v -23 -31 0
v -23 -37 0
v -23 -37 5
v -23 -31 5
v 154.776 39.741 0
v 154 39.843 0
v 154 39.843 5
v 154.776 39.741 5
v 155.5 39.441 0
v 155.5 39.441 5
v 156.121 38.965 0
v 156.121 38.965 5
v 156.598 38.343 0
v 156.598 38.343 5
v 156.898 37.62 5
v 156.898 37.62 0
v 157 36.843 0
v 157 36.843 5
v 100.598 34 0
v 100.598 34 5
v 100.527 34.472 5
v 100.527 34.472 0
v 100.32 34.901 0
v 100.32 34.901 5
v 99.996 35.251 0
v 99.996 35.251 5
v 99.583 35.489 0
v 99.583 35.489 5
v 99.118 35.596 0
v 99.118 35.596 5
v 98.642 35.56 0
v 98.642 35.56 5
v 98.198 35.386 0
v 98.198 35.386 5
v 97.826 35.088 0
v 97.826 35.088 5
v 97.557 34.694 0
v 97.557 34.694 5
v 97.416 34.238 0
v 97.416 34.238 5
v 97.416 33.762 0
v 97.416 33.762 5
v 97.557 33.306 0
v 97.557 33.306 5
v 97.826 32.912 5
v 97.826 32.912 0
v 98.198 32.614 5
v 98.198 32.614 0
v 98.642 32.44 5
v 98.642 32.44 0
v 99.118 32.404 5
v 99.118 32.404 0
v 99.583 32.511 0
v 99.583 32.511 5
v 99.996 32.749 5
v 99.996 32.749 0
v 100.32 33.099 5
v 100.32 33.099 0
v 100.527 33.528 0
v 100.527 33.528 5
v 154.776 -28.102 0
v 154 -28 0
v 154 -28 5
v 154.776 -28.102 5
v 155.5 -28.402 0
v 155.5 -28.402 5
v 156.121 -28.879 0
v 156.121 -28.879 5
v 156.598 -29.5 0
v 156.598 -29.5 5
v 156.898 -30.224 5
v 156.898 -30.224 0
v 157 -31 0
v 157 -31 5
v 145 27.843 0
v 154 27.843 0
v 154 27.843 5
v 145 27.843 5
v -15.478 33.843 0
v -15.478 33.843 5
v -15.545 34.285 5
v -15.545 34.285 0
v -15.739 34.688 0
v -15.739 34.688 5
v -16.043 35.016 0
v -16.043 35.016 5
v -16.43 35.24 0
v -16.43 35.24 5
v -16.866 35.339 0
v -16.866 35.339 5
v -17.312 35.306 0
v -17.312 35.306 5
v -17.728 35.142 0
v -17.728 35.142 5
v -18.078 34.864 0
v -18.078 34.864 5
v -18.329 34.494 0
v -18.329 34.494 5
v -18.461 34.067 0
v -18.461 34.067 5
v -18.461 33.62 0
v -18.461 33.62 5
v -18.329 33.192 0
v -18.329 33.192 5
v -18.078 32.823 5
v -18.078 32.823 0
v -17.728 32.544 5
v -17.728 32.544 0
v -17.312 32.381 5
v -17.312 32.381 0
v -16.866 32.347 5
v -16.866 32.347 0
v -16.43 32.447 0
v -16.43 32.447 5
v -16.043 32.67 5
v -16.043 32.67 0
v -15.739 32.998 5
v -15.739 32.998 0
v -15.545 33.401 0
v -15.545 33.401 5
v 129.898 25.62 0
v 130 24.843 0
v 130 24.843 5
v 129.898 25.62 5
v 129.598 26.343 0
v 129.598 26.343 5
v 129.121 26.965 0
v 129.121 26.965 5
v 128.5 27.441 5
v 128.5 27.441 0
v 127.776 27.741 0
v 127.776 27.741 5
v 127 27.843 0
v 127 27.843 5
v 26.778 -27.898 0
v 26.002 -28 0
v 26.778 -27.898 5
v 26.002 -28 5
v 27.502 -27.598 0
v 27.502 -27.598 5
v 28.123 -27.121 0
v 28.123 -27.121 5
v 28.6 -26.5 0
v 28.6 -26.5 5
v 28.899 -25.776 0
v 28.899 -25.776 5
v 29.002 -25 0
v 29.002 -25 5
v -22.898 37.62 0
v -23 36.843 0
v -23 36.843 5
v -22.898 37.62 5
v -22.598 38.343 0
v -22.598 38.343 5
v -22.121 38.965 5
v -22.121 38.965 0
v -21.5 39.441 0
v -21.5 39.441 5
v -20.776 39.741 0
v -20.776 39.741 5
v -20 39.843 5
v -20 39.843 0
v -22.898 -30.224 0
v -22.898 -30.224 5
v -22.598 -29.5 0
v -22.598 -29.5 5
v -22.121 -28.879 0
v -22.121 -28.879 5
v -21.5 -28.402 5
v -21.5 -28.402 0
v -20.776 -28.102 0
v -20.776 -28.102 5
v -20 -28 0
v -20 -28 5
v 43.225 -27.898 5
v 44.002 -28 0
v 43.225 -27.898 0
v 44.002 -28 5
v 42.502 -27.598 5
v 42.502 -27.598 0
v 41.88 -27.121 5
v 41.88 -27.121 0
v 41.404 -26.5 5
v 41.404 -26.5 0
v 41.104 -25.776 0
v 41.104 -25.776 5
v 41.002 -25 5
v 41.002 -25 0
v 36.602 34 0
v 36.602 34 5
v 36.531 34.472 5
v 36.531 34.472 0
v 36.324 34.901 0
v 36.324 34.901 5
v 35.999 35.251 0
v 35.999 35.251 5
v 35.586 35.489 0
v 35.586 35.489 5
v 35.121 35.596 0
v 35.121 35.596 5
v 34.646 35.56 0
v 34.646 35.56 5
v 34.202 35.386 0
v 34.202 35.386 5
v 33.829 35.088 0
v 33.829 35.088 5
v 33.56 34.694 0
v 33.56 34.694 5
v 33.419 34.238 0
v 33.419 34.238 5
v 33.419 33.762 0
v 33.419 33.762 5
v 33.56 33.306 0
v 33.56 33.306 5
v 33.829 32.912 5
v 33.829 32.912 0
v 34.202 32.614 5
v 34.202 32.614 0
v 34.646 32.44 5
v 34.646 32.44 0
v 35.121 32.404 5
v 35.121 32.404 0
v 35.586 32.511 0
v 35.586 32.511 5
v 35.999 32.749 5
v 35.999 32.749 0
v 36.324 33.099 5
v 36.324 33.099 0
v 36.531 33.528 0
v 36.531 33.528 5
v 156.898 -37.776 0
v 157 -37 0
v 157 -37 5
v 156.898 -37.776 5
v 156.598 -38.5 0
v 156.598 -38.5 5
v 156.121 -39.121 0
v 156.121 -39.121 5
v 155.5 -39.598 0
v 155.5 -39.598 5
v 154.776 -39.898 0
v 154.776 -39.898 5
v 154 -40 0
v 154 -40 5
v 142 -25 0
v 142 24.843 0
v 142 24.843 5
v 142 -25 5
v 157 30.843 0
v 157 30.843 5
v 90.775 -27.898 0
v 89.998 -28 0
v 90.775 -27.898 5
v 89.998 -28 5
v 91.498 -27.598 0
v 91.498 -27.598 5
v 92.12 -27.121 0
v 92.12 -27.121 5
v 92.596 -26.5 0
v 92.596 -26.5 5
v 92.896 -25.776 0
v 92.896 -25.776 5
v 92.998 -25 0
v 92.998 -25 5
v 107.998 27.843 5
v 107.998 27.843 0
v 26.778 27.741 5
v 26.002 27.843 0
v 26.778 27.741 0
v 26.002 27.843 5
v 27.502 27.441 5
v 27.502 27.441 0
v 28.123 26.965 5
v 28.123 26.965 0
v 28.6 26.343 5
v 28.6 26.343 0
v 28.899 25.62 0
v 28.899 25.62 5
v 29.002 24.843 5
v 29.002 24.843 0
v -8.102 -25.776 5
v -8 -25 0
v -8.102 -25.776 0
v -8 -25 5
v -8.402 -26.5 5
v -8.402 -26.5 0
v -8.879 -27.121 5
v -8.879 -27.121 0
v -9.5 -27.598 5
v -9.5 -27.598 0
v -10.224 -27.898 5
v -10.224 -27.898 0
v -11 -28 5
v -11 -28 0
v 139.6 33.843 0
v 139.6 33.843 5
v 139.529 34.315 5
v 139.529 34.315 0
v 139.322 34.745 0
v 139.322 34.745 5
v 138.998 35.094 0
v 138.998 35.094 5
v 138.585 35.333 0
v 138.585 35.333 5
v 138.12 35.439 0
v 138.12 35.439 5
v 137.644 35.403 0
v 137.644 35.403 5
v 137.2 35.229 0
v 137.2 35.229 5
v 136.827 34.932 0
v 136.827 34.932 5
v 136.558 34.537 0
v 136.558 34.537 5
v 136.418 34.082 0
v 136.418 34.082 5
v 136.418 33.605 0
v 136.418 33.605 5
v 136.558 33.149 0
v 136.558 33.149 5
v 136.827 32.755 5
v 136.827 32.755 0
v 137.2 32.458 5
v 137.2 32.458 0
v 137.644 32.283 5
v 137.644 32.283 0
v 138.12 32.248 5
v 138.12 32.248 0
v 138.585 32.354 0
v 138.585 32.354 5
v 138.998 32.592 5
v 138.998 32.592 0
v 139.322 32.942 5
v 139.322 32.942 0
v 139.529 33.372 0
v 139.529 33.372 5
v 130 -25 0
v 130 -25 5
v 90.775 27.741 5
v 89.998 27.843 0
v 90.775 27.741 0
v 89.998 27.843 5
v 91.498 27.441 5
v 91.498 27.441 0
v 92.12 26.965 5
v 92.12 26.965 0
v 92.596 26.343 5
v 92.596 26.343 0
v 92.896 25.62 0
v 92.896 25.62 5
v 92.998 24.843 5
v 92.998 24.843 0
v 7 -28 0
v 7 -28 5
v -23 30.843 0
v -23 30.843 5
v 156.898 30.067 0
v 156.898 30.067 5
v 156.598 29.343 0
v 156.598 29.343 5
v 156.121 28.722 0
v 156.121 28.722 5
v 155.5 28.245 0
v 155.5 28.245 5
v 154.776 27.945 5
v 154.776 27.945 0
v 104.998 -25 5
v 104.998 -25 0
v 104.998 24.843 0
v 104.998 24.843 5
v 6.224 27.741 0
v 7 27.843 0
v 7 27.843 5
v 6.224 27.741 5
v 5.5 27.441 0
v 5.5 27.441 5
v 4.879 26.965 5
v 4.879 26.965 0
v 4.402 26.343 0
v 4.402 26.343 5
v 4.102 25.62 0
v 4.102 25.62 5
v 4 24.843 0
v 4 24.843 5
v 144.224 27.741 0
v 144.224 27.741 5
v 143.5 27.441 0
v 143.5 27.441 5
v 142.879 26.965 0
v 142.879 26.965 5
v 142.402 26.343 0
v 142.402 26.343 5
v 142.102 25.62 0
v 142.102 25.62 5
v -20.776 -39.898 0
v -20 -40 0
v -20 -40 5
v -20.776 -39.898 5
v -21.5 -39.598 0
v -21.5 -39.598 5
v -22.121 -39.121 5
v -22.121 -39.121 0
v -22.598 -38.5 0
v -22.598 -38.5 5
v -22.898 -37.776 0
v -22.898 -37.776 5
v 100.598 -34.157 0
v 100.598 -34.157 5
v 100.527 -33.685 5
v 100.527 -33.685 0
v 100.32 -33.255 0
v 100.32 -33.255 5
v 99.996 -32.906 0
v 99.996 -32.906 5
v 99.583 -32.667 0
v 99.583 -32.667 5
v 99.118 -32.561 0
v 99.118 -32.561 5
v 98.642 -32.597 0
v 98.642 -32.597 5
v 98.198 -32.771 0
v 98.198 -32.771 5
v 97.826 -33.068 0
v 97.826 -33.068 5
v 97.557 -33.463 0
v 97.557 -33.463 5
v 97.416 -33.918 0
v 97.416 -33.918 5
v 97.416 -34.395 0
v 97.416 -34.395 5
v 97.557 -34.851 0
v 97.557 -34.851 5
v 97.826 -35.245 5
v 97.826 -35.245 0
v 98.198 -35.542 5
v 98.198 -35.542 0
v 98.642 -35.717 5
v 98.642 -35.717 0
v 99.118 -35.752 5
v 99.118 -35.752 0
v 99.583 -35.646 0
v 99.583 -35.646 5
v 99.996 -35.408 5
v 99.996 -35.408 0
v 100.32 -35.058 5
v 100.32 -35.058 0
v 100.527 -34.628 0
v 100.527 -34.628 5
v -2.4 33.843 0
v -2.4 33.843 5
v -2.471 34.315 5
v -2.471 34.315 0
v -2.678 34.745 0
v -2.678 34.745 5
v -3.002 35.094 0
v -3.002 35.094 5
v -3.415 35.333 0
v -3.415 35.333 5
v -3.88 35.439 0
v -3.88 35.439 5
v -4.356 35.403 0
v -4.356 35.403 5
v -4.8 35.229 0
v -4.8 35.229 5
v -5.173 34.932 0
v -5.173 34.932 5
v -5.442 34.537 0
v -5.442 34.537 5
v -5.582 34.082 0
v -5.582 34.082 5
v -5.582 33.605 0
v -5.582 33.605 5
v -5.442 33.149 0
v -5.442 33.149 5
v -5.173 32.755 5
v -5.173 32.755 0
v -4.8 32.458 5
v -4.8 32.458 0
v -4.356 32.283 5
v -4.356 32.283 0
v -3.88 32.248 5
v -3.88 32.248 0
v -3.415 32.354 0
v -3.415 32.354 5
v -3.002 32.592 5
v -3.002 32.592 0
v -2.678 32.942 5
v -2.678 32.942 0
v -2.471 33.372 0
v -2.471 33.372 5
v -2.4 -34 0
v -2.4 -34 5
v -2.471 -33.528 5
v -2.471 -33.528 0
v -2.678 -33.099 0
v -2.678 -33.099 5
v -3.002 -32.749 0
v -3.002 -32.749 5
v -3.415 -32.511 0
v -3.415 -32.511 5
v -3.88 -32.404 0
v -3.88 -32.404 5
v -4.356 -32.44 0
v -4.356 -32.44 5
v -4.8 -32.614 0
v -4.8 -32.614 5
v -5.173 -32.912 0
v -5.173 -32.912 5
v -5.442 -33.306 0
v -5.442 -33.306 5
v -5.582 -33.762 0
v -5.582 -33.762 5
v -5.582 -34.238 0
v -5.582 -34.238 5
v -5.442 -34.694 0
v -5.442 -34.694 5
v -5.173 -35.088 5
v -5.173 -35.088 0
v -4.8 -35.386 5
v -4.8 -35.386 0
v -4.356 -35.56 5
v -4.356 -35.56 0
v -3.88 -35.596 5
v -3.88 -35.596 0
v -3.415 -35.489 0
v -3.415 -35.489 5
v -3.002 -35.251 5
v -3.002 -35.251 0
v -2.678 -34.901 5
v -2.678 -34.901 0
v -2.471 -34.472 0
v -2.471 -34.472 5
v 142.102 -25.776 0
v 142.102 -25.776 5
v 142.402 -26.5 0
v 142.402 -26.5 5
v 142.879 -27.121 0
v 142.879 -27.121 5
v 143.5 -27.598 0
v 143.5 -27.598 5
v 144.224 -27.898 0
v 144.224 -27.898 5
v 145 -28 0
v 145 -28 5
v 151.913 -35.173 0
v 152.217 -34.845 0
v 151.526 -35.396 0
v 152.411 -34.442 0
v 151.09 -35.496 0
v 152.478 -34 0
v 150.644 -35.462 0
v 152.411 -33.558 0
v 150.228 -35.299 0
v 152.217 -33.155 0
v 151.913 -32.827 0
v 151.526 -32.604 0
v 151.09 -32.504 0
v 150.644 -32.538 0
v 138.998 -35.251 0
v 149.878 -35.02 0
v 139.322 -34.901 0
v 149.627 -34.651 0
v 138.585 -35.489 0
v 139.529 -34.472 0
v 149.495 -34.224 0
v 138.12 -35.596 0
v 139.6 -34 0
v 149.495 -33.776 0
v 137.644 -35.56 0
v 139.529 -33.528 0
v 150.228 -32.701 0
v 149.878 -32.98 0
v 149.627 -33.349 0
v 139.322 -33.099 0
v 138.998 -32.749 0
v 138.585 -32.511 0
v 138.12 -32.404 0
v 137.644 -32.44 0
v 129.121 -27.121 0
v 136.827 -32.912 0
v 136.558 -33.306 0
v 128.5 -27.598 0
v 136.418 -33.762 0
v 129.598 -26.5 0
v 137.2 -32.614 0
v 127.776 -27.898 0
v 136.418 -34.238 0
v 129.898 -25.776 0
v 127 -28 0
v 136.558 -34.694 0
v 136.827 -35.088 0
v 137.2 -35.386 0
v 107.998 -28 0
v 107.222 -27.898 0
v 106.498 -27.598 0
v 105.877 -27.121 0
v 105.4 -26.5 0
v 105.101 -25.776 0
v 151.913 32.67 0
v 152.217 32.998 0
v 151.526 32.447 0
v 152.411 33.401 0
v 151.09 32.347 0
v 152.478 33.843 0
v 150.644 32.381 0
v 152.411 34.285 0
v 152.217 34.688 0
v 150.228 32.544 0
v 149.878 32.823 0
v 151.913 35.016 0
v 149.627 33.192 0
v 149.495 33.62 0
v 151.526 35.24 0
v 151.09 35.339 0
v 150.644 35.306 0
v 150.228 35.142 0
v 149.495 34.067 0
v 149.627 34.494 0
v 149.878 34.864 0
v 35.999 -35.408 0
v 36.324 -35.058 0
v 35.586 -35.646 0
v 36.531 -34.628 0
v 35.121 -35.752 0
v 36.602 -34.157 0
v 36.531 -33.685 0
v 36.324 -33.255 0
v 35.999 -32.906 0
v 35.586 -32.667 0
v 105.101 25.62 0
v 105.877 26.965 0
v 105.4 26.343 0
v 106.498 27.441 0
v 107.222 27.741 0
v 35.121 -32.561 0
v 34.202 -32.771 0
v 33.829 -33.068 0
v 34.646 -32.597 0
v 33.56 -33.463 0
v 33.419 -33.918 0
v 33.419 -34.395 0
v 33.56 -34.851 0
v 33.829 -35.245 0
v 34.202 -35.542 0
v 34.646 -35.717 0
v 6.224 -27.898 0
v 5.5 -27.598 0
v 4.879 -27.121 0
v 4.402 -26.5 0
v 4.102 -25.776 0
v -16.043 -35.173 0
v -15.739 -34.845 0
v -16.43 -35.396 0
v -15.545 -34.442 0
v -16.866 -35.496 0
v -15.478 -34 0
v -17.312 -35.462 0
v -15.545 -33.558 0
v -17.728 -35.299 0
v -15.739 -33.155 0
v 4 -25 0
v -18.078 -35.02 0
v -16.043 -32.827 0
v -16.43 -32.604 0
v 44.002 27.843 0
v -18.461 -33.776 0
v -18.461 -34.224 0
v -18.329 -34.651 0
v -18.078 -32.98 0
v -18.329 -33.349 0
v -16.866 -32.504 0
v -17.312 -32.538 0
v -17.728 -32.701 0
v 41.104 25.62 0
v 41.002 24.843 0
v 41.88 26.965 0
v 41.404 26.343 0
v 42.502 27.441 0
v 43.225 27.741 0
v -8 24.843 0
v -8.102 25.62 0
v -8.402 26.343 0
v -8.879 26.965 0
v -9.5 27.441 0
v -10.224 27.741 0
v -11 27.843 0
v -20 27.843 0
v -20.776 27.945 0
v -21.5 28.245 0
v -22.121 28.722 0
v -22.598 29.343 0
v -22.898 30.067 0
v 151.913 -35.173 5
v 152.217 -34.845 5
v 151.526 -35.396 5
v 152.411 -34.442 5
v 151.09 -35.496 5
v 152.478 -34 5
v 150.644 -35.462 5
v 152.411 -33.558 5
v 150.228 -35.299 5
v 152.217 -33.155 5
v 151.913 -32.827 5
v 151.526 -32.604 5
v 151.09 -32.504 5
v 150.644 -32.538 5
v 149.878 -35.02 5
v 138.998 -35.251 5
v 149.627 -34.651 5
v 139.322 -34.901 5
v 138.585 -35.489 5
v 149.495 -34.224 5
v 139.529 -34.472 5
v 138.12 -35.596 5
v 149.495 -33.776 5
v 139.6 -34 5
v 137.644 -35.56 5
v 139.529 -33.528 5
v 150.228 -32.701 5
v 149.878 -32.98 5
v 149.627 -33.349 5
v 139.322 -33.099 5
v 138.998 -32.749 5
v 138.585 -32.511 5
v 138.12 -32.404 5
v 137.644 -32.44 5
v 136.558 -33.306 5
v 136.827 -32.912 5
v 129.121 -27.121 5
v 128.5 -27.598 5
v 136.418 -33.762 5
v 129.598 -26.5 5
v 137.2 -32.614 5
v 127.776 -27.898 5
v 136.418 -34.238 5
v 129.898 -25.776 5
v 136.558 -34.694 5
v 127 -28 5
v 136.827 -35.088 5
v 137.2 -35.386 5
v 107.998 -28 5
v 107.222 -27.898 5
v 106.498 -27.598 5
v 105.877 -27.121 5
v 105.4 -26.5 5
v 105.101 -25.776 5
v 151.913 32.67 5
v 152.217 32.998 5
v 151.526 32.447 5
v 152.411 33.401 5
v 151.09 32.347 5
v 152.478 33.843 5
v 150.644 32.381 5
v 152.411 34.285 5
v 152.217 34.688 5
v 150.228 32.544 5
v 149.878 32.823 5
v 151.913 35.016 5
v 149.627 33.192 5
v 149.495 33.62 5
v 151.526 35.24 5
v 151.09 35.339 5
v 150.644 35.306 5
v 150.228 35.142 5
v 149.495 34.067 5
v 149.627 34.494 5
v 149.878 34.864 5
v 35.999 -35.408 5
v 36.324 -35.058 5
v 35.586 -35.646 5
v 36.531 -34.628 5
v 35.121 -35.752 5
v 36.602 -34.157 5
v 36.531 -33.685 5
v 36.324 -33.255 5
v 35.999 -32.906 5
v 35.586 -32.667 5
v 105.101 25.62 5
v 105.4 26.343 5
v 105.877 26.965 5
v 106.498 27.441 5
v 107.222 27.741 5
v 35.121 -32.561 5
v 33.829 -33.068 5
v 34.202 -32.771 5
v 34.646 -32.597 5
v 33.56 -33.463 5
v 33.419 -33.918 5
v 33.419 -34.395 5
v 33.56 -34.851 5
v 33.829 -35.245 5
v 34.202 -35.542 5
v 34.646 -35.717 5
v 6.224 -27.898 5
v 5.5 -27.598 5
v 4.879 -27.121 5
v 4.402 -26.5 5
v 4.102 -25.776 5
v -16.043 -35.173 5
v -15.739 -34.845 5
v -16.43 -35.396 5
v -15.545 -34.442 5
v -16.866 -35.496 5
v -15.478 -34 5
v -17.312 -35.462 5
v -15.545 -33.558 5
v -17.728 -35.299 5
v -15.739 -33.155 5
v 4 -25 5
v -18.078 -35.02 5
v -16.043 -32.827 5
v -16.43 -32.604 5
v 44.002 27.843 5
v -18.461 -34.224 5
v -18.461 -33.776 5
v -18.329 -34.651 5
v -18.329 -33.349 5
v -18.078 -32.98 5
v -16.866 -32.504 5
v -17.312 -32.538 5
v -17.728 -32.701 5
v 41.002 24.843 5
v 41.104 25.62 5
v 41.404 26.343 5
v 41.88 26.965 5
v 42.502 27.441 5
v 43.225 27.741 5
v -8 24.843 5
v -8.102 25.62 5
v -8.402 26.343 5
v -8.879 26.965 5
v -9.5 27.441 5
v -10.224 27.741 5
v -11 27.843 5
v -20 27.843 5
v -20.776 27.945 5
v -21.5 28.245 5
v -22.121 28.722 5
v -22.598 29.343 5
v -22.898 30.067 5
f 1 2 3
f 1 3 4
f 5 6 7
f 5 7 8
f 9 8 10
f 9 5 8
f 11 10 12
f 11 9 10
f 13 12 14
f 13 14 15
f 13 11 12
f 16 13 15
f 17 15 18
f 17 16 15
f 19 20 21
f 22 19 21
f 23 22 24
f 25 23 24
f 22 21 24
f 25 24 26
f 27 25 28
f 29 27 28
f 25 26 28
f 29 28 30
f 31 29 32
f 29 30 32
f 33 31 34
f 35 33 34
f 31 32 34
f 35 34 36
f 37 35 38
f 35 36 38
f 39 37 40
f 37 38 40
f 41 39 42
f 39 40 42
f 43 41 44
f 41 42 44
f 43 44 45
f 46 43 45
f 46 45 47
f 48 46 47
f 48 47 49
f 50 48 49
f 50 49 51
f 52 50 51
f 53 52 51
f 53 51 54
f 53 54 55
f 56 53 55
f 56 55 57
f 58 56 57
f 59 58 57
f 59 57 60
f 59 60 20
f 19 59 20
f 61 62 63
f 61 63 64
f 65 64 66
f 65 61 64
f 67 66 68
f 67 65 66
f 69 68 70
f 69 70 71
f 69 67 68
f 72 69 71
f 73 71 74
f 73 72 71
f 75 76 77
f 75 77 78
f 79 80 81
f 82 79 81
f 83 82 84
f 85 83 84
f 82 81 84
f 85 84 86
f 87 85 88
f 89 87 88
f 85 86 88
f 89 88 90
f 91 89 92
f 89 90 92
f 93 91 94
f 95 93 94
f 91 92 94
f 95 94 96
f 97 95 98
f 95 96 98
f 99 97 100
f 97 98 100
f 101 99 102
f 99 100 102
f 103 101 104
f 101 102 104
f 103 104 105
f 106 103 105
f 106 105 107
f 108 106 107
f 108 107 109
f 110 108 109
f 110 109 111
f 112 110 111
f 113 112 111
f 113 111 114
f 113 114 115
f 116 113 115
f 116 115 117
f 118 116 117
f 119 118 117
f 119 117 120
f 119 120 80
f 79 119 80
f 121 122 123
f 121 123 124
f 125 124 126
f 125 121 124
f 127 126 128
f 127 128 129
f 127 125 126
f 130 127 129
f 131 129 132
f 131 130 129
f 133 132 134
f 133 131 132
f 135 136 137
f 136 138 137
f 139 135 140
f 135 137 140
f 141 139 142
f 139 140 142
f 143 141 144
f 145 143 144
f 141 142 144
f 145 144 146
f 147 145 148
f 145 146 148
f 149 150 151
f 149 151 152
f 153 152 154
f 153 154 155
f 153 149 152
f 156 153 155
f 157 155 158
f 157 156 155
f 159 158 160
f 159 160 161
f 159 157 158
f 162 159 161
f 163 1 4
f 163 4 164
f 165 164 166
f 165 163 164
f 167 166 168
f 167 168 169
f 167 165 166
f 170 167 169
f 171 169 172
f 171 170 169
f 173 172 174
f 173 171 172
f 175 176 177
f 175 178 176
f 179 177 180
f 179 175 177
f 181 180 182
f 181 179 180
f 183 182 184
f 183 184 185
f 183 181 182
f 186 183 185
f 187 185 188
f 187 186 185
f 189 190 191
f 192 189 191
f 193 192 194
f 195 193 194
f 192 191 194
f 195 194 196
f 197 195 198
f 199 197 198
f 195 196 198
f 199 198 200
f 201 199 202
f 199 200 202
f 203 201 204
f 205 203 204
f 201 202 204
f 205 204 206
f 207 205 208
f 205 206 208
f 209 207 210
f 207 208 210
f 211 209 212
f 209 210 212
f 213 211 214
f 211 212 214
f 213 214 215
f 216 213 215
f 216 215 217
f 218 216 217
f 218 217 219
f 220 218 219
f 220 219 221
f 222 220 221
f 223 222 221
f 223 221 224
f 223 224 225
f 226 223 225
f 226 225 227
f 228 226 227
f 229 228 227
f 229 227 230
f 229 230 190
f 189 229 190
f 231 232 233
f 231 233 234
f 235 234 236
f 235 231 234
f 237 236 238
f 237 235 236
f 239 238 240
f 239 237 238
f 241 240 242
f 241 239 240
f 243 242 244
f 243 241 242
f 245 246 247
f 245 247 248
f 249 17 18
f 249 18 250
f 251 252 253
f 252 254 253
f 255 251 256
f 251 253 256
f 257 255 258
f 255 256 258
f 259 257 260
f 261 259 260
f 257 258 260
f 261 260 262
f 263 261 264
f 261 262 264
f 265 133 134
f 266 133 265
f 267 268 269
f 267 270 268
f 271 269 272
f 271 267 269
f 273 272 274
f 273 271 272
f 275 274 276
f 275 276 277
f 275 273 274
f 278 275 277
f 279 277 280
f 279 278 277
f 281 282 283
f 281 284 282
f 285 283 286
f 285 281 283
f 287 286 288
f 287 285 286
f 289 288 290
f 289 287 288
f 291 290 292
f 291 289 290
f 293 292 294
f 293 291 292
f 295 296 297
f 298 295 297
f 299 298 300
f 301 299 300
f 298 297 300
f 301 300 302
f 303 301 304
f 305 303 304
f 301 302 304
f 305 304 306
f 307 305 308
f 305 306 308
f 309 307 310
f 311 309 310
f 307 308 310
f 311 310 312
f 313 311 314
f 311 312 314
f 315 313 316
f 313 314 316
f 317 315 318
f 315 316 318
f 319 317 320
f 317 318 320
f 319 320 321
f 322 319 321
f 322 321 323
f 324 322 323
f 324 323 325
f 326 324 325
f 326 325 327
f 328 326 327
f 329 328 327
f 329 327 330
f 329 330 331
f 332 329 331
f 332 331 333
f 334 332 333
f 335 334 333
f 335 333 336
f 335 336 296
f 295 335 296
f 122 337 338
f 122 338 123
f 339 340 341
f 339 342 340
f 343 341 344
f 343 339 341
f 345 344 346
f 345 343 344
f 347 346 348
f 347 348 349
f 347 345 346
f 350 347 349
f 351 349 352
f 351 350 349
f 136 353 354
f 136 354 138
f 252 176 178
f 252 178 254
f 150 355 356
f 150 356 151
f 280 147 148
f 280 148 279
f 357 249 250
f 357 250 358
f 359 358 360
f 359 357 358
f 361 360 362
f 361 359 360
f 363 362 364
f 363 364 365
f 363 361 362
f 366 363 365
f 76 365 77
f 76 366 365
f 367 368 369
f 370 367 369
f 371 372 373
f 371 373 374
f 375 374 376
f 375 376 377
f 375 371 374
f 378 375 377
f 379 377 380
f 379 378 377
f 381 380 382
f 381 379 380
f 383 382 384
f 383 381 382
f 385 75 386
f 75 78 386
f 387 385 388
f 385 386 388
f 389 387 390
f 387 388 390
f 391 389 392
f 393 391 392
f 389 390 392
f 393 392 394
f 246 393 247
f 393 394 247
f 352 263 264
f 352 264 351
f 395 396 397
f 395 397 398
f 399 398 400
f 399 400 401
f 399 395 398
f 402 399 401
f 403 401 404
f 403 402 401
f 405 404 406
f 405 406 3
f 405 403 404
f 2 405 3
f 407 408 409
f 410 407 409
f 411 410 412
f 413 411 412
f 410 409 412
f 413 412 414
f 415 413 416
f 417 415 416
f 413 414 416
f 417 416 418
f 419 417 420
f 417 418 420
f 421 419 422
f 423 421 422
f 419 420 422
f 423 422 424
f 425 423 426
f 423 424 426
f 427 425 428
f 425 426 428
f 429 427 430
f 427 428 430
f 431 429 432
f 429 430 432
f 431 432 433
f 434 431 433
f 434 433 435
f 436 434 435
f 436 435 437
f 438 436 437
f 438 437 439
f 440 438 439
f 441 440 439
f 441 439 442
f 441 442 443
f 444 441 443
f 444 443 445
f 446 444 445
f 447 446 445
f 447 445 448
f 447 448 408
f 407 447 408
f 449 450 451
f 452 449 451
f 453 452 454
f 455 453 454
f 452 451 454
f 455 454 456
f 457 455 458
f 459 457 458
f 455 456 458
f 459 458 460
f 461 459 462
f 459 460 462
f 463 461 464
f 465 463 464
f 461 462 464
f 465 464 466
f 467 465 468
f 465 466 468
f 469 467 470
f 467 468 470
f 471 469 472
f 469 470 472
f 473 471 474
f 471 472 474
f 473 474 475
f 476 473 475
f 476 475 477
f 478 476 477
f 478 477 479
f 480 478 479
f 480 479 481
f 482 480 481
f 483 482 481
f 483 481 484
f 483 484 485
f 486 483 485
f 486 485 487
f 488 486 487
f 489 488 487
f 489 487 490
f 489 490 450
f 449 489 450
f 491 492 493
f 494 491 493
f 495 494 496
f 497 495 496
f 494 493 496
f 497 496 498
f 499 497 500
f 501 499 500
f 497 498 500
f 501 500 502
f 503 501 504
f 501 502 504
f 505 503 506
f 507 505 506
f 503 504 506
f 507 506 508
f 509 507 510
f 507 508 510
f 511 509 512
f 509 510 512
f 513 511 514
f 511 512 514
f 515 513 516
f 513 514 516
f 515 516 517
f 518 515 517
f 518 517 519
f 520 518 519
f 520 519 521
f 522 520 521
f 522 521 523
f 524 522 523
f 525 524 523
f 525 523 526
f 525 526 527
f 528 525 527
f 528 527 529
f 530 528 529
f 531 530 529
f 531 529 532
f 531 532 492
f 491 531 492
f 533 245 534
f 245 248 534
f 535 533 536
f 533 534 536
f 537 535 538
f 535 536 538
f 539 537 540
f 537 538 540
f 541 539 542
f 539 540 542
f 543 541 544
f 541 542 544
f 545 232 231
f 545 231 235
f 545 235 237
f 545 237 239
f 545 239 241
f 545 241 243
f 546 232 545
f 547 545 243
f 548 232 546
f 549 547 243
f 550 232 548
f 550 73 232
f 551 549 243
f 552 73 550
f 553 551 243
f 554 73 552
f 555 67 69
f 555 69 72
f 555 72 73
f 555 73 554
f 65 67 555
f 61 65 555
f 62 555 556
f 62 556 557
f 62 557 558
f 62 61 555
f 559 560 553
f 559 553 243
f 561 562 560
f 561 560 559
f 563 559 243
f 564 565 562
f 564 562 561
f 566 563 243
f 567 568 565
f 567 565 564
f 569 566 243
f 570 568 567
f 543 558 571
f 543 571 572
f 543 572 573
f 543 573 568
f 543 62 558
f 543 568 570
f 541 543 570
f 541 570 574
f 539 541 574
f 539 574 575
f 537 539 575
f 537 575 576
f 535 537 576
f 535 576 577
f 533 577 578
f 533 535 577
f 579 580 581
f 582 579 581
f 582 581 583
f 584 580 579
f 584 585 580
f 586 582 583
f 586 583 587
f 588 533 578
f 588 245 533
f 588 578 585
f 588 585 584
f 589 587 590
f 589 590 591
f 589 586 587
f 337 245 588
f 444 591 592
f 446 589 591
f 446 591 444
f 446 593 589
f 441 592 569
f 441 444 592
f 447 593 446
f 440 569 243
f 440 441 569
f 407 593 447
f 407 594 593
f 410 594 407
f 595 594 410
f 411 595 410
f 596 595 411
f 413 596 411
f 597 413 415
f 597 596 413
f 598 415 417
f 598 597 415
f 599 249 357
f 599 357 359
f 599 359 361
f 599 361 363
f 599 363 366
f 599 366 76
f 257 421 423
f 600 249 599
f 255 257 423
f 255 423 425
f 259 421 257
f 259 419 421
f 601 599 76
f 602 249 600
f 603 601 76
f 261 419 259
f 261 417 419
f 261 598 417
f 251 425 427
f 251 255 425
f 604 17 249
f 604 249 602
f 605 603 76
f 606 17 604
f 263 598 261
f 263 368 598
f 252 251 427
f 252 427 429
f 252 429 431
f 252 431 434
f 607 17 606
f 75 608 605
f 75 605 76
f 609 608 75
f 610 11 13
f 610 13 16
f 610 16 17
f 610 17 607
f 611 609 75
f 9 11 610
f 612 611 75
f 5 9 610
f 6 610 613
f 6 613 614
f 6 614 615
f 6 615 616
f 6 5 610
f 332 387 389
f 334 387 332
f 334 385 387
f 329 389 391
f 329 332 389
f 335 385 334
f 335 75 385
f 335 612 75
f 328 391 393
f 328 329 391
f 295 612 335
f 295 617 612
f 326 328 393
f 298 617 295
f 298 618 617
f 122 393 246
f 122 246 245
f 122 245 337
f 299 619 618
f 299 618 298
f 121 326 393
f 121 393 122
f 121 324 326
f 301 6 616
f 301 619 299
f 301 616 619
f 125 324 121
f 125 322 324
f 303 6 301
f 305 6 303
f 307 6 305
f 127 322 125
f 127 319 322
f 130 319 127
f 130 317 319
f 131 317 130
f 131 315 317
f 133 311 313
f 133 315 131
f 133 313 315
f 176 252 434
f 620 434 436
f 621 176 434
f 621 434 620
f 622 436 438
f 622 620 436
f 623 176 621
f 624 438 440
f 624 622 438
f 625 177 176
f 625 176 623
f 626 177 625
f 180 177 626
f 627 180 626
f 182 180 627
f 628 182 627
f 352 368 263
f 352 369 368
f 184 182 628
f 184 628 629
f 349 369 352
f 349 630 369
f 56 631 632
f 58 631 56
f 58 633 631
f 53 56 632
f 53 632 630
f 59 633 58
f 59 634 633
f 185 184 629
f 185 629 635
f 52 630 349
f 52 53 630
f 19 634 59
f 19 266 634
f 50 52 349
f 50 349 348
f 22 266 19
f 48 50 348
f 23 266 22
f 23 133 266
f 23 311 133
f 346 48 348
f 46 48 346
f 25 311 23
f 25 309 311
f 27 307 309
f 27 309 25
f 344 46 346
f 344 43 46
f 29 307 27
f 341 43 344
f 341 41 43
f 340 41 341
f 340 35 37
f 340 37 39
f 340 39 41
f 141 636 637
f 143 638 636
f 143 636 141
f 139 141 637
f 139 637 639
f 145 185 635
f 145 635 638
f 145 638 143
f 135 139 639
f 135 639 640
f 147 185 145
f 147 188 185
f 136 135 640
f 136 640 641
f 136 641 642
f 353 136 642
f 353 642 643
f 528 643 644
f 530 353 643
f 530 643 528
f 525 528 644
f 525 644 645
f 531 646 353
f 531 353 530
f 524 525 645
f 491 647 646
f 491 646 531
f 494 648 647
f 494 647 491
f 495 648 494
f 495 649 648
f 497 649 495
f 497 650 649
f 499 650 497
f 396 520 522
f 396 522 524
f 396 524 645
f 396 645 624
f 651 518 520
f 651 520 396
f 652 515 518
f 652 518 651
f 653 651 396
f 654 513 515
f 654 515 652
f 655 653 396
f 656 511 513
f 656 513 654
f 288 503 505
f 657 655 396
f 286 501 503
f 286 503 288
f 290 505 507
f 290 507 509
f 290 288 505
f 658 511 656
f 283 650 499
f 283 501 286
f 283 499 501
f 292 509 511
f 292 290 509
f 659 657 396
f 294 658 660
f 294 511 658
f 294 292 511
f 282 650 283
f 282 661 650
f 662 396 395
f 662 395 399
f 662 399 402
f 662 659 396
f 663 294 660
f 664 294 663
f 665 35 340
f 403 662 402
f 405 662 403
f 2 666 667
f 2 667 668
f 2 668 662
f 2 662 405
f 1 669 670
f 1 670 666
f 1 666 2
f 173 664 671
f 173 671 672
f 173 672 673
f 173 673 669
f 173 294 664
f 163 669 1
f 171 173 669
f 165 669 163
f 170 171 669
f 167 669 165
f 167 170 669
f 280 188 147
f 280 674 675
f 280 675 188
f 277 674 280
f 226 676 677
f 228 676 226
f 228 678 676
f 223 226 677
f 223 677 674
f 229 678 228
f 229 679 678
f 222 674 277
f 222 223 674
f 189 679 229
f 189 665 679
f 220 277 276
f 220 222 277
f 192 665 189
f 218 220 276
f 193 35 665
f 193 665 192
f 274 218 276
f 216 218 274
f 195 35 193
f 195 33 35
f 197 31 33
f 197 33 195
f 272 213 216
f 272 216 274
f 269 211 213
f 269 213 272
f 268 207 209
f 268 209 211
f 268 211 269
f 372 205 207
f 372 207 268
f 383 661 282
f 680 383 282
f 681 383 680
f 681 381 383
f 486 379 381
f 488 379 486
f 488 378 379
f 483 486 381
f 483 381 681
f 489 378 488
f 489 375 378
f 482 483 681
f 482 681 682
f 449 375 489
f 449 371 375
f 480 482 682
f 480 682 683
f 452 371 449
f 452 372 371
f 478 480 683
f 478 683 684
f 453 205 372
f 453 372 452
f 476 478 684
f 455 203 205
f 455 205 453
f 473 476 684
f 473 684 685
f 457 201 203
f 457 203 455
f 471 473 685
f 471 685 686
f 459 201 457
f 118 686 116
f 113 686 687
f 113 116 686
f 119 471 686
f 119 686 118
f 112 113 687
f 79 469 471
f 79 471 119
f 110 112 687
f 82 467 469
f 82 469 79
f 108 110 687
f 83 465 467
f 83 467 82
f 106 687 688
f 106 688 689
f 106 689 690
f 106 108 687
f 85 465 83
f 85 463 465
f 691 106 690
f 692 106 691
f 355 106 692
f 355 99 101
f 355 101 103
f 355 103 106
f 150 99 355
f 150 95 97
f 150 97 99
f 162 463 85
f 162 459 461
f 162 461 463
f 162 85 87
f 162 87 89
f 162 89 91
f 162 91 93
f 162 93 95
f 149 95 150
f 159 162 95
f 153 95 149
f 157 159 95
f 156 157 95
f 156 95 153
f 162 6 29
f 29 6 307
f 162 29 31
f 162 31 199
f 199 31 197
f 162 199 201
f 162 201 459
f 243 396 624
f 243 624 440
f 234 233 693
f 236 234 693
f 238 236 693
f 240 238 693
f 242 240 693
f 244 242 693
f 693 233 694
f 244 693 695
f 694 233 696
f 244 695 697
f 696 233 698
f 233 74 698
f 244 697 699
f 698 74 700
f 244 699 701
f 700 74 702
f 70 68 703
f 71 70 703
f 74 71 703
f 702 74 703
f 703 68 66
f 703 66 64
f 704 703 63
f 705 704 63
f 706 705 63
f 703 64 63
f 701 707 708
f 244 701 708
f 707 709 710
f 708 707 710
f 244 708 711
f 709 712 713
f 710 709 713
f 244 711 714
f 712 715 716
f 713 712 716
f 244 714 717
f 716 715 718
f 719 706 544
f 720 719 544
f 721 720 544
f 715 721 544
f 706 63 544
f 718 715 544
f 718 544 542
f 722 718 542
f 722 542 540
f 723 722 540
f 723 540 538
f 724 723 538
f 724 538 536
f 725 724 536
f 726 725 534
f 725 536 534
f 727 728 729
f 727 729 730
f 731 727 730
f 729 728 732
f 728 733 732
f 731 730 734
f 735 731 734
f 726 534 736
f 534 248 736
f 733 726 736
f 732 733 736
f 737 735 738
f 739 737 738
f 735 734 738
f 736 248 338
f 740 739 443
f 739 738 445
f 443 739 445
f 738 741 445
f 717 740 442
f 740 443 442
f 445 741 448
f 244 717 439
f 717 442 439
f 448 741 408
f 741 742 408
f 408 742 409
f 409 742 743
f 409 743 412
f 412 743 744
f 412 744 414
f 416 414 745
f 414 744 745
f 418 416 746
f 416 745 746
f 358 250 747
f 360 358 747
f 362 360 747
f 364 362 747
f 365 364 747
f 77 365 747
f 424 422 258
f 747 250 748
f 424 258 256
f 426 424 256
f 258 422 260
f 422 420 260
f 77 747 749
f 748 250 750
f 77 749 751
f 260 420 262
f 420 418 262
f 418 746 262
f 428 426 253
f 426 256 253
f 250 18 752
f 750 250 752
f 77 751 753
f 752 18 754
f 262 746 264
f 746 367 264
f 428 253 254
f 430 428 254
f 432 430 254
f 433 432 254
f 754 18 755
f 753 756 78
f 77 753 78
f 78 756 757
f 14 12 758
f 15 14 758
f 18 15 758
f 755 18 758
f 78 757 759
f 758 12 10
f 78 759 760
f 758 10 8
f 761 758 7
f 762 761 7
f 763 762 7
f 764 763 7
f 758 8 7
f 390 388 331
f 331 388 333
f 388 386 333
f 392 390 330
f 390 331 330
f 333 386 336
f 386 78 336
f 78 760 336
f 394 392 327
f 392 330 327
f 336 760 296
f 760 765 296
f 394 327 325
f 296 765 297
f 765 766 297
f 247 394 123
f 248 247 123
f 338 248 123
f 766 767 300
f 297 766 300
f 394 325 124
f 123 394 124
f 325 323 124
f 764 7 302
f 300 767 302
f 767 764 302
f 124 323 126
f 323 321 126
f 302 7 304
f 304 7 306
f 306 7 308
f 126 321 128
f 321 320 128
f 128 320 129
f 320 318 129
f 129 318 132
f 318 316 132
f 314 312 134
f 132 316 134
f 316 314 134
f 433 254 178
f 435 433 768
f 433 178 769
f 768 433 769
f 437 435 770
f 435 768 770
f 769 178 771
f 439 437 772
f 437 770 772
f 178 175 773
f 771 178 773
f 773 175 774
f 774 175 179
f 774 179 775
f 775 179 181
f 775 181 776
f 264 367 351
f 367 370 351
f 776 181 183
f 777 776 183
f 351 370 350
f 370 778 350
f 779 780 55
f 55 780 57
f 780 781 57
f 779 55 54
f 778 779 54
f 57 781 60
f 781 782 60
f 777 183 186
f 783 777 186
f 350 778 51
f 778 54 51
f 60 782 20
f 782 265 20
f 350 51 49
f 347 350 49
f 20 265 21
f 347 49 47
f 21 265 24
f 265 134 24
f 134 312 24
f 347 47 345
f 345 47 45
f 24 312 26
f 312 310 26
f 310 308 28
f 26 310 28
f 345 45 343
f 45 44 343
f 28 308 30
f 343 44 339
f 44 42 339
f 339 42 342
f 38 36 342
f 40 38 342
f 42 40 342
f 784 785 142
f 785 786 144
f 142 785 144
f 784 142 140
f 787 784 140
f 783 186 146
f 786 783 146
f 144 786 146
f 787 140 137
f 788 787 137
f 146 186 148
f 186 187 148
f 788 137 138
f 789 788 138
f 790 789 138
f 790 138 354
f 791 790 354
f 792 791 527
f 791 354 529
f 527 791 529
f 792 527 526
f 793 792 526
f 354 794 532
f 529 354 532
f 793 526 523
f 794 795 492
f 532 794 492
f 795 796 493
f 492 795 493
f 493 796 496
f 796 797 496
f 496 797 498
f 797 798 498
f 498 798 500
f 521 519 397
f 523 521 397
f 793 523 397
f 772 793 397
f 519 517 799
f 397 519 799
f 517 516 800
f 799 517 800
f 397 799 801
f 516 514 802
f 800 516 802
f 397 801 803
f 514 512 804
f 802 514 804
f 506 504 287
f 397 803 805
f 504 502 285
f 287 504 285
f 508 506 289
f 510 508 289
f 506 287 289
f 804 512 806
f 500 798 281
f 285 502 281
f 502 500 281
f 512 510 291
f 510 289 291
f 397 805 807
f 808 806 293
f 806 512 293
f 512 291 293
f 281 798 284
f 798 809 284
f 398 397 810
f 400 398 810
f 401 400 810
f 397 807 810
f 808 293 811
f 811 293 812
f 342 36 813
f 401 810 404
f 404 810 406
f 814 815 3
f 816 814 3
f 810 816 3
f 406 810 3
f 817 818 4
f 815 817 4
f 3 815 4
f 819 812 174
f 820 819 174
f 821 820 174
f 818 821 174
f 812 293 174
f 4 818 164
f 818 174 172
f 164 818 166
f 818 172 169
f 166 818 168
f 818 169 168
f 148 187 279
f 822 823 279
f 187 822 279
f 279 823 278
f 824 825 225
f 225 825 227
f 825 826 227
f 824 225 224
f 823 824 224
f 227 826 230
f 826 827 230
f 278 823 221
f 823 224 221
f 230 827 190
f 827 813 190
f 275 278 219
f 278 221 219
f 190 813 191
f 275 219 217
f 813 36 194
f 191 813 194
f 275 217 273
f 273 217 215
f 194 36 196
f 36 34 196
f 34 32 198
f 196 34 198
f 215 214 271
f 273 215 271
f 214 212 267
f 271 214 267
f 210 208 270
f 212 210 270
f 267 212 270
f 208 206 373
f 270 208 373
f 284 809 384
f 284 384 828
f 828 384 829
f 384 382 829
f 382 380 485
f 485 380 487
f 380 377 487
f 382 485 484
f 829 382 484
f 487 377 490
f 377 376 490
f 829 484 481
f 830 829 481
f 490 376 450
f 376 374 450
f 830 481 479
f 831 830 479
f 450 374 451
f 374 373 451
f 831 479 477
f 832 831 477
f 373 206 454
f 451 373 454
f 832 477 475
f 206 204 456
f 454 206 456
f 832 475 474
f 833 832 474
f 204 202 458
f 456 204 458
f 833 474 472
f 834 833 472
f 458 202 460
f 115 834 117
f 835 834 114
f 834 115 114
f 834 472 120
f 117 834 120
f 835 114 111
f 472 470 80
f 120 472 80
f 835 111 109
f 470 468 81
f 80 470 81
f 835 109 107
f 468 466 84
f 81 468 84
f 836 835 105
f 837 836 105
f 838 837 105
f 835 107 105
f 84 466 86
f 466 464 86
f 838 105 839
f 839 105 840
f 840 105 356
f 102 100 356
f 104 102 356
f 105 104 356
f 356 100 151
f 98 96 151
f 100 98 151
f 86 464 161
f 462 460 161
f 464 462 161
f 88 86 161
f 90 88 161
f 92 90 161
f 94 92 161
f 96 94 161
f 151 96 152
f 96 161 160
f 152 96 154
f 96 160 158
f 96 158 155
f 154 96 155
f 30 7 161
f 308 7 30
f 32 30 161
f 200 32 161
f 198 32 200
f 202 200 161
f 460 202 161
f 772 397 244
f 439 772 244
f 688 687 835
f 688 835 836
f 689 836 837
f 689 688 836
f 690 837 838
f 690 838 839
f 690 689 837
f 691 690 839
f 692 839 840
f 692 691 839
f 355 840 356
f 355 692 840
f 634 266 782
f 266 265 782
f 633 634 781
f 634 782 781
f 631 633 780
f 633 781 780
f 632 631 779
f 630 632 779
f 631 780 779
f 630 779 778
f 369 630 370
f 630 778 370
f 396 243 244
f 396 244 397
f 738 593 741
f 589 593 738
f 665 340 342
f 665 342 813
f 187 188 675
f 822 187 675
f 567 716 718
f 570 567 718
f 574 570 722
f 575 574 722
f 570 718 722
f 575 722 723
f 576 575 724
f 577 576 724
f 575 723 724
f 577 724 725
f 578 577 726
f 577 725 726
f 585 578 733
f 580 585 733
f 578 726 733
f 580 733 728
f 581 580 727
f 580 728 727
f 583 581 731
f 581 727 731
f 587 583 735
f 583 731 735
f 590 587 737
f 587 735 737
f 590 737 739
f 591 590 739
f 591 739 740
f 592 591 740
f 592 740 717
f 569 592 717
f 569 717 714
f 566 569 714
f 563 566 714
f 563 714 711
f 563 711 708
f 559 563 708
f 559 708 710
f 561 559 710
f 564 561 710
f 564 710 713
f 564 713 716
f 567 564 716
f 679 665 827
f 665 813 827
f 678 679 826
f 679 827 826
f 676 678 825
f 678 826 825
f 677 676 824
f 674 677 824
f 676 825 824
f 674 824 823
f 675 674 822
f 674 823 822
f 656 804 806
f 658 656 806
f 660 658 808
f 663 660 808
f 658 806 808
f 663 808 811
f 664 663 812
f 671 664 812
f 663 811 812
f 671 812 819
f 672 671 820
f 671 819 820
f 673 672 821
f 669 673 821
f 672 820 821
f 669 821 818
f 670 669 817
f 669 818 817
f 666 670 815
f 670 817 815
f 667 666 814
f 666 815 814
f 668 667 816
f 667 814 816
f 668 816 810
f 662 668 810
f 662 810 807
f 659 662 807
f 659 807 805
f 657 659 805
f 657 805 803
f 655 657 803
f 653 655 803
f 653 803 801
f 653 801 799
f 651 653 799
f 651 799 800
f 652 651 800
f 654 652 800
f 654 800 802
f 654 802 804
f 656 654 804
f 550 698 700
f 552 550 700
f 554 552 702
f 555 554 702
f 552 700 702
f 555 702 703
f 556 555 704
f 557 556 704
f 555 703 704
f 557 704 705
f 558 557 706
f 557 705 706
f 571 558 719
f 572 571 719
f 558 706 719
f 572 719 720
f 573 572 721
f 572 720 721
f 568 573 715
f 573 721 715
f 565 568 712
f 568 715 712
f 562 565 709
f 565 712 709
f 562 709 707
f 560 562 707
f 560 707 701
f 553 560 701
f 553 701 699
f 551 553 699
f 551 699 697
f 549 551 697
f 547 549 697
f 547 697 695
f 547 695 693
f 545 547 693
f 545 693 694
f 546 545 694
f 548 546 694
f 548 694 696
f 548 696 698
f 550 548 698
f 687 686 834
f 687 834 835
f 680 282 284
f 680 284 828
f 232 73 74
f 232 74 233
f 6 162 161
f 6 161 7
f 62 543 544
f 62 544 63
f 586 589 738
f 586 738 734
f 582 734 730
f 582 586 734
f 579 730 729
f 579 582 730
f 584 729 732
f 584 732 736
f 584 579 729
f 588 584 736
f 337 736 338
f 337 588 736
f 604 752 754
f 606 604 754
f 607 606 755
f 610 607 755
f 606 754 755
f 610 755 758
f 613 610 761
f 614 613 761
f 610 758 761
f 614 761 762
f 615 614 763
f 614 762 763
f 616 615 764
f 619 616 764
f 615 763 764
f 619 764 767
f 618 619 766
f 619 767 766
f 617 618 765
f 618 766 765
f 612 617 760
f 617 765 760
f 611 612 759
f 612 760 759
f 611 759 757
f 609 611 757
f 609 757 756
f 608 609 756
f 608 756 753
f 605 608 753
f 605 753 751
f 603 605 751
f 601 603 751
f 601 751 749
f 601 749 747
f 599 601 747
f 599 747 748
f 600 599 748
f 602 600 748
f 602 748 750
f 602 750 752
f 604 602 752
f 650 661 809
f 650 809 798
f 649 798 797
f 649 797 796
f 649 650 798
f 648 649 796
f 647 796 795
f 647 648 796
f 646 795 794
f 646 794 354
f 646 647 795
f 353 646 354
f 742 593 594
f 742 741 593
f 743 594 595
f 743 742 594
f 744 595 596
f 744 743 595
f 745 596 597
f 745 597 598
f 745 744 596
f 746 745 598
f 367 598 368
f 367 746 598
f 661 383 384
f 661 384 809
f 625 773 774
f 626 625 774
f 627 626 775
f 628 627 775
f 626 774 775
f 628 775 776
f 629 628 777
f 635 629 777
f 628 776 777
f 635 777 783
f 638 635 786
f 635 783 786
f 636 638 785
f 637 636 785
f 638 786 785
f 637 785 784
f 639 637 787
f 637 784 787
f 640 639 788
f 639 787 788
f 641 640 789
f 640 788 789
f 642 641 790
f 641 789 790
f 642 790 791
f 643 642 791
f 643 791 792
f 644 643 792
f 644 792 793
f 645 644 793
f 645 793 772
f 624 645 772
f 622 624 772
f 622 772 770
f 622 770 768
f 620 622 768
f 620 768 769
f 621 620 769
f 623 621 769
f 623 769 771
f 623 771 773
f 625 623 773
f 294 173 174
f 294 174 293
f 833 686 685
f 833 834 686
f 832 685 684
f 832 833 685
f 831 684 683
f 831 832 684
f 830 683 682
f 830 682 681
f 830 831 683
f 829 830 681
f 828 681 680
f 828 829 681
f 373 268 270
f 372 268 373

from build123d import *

# Parameters (mm, degrees)
EXTRUDE_1_DEPTH     = 5
FILLET_1_R          = 3
SKETCH_2_R          = 1.5
SKETCH_2_R_2        = 1.6
CUT_EXTRUDE_1_DEPTH = 7
SKETCH_3_W          = 12
SKETCH_3_H          = 55.843243592
EXTRUDE_2_DEPTH     = 5
FILLET_2_R          = 3


with BuildPart() as part:
    # 草图1 → 凸台-拉伸1 (new body)
    with BuildSketch(Plane.XY):
        with BuildLine():
            Line((-20, 39.843243592), (154, 39.843243592))
            ThreePointArc((154, 39.843243592), (156.121320344, 38.964563935), (157, 36.843243592))
            Line((157, 36.843243592), (157, 30.843243592))
            ThreePointArc((157, 30.843243592), (156.121320344, 28.721923248), (154, 27.843243592))
            Line((154, 27.843243592), (142, 27.843243592))
            Line((142, 27.843243592), (142, -28))
            Line((142, -28), (154, -28))
            ThreePointArc((154, -28), (156.121320344, -28.878679656), (157, -31))
            Line((157, -31), (157, -37))
            ThreePointArc((157, -37), (156.121320344, -39.121320344), (154, -40))
            Line((154, -40), (-20, -40))
            ThreePointArc((-20, -40), (-22.121320344, -39.121320344), (-23, -37))
            Line((-23, -37), (-23, -31))
            ThreePointArc((-23, -31), (-22.121320344, -28.878679656), (-20, -28))
            Line((-20, -28), (-8, -28))
            Line((-8, -28), (-8, 27.843243592))
            Line((-8, 27.843243592), (-20, 27.843243592))
            ThreePointArc((-20, 27.843243592), (-22.121320344, 28.721923248), (-23, 30.843243592))
            Line((-23, 30.843243592), (-23, 36.843243592))
            ThreePointArc((-23, 36.843243592), (-22.121320344, 38.964563935), (-20, 39.843243592))
        make_face()
        with BuildLine():
            ThreePointArc((7, 27.843243592), (4.878679656, 26.964563935), (4, 24.843243592))
            Line((4, 24.843243592), (4, -25))
            ThreePointArc((4, -25), (4.878679656, -27.121320344), (7, -28))
            Line((7, -28), (127, -28))
            ThreePointArc((127, -28), (129.121320344, -27.121320344), (130, -25))
            Line((130, -25), (130, 24.843243592))
            ThreePointArc((130, 24.843243592), (129.121320344, 26.964563935), (127, 27.843243592))
            Line((127, 27.843243592), (7, 27.843243592))
        make_face(mode=Mode.SUBTRACT)
    extrude(amount=EXTRUDE_1_DEPTH)

    # 圆角1
    fillet_1_edges = [part.edges().sort_by_distance(p)[0] for p in [
        (142, 27.843243592, 2.5),
        (142, -28, 2.5),
        (-8, -28, 2.5),
        (-8, 27.843243592, 2.5),
    ]]
    fillet(fillet_1_edges, radius=FILLET_1_R)

    # 草图2 → 切除-拉伸1 (cut)
    with BuildSketch(Plane.XY.offset(5)):
        with Locations((-16.977965312, 33.843243592)):
            Circle(SKETCH_2_R)
        with Locations((-4, 33.843243592)):
            Circle(SKETCH_2_R_2)
        with Locations((35.001599808, 34)):
            Circle(SKETCH_2_R_2)
        with Locations((98.998400192, 34)):
            Circle(SKETCH_2_R_2)
        with Locations((138, 33.843243592)):
            Circle(SKETCH_2_R_2)
        with Locations((150.977965312, 33.843243592)):
            Circle(SKETCH_2_R)
        with Locations((150.977965312, -34)):
            Circle(SKETCH_2_R)
        with Locations((138, -34)):
            Circle(SKETCH_2_R_2)
        with Locations((98.998400192, -34.156756408)):
            Circle(SKETCH_2_R_2)
        with Locations((35.001599808, -34.156756408)):
            Circle(SKETCH_2_R_2)
        with Locations((-4, -34)):
            Circle(SKETCH_2_R_2)
        with Locations((-16.977965312, -34)):
            Circle(SKETCH_2_R)
    extrude(amount=-CUT_EXTRUDE_1_DEPTH, mode=Mode.SUBTRACT)

    # 草图3 → 凸台-拉伸2 (add)
    with BuildSketch(Plane(origin=(0, 0, 0), x_dir=(-1, 0, 0), z_dir=(0, 0, -1))):
        with Locations((-98.998400192, -0.078378204)):
            Rectangle(SKETCH_3_W, SKETCH_3_H)
        with Locations((-35.001599808, -0.078378204)):
            Rectangle(SKETCH_3_W, SKETCH_3_H)
    extrude(amount=-EXTRUDE_2_DEPTH)

    # 圆角2
    fillet_2_edges = [part.edges().sort_by_distance(p)[0] for p in [
        (104.998400192, -28, 2.5),
        (104.998400192, 27.843243592, 2.5),
        (92.998400192, 27.843243592, 2.5),
        (92.998400192, -28, 2.5),
        (41.001599808, -28, 2.5),
        (41.001599808, 27.843243592, 2.5),
        (29.001599808, 27.843243592, 2.5),
        (29.001599808, -28, 2.5),
    ]]
    fillet(fillet_2_edges, radius=FILLET_2_R)


solid = part.part
